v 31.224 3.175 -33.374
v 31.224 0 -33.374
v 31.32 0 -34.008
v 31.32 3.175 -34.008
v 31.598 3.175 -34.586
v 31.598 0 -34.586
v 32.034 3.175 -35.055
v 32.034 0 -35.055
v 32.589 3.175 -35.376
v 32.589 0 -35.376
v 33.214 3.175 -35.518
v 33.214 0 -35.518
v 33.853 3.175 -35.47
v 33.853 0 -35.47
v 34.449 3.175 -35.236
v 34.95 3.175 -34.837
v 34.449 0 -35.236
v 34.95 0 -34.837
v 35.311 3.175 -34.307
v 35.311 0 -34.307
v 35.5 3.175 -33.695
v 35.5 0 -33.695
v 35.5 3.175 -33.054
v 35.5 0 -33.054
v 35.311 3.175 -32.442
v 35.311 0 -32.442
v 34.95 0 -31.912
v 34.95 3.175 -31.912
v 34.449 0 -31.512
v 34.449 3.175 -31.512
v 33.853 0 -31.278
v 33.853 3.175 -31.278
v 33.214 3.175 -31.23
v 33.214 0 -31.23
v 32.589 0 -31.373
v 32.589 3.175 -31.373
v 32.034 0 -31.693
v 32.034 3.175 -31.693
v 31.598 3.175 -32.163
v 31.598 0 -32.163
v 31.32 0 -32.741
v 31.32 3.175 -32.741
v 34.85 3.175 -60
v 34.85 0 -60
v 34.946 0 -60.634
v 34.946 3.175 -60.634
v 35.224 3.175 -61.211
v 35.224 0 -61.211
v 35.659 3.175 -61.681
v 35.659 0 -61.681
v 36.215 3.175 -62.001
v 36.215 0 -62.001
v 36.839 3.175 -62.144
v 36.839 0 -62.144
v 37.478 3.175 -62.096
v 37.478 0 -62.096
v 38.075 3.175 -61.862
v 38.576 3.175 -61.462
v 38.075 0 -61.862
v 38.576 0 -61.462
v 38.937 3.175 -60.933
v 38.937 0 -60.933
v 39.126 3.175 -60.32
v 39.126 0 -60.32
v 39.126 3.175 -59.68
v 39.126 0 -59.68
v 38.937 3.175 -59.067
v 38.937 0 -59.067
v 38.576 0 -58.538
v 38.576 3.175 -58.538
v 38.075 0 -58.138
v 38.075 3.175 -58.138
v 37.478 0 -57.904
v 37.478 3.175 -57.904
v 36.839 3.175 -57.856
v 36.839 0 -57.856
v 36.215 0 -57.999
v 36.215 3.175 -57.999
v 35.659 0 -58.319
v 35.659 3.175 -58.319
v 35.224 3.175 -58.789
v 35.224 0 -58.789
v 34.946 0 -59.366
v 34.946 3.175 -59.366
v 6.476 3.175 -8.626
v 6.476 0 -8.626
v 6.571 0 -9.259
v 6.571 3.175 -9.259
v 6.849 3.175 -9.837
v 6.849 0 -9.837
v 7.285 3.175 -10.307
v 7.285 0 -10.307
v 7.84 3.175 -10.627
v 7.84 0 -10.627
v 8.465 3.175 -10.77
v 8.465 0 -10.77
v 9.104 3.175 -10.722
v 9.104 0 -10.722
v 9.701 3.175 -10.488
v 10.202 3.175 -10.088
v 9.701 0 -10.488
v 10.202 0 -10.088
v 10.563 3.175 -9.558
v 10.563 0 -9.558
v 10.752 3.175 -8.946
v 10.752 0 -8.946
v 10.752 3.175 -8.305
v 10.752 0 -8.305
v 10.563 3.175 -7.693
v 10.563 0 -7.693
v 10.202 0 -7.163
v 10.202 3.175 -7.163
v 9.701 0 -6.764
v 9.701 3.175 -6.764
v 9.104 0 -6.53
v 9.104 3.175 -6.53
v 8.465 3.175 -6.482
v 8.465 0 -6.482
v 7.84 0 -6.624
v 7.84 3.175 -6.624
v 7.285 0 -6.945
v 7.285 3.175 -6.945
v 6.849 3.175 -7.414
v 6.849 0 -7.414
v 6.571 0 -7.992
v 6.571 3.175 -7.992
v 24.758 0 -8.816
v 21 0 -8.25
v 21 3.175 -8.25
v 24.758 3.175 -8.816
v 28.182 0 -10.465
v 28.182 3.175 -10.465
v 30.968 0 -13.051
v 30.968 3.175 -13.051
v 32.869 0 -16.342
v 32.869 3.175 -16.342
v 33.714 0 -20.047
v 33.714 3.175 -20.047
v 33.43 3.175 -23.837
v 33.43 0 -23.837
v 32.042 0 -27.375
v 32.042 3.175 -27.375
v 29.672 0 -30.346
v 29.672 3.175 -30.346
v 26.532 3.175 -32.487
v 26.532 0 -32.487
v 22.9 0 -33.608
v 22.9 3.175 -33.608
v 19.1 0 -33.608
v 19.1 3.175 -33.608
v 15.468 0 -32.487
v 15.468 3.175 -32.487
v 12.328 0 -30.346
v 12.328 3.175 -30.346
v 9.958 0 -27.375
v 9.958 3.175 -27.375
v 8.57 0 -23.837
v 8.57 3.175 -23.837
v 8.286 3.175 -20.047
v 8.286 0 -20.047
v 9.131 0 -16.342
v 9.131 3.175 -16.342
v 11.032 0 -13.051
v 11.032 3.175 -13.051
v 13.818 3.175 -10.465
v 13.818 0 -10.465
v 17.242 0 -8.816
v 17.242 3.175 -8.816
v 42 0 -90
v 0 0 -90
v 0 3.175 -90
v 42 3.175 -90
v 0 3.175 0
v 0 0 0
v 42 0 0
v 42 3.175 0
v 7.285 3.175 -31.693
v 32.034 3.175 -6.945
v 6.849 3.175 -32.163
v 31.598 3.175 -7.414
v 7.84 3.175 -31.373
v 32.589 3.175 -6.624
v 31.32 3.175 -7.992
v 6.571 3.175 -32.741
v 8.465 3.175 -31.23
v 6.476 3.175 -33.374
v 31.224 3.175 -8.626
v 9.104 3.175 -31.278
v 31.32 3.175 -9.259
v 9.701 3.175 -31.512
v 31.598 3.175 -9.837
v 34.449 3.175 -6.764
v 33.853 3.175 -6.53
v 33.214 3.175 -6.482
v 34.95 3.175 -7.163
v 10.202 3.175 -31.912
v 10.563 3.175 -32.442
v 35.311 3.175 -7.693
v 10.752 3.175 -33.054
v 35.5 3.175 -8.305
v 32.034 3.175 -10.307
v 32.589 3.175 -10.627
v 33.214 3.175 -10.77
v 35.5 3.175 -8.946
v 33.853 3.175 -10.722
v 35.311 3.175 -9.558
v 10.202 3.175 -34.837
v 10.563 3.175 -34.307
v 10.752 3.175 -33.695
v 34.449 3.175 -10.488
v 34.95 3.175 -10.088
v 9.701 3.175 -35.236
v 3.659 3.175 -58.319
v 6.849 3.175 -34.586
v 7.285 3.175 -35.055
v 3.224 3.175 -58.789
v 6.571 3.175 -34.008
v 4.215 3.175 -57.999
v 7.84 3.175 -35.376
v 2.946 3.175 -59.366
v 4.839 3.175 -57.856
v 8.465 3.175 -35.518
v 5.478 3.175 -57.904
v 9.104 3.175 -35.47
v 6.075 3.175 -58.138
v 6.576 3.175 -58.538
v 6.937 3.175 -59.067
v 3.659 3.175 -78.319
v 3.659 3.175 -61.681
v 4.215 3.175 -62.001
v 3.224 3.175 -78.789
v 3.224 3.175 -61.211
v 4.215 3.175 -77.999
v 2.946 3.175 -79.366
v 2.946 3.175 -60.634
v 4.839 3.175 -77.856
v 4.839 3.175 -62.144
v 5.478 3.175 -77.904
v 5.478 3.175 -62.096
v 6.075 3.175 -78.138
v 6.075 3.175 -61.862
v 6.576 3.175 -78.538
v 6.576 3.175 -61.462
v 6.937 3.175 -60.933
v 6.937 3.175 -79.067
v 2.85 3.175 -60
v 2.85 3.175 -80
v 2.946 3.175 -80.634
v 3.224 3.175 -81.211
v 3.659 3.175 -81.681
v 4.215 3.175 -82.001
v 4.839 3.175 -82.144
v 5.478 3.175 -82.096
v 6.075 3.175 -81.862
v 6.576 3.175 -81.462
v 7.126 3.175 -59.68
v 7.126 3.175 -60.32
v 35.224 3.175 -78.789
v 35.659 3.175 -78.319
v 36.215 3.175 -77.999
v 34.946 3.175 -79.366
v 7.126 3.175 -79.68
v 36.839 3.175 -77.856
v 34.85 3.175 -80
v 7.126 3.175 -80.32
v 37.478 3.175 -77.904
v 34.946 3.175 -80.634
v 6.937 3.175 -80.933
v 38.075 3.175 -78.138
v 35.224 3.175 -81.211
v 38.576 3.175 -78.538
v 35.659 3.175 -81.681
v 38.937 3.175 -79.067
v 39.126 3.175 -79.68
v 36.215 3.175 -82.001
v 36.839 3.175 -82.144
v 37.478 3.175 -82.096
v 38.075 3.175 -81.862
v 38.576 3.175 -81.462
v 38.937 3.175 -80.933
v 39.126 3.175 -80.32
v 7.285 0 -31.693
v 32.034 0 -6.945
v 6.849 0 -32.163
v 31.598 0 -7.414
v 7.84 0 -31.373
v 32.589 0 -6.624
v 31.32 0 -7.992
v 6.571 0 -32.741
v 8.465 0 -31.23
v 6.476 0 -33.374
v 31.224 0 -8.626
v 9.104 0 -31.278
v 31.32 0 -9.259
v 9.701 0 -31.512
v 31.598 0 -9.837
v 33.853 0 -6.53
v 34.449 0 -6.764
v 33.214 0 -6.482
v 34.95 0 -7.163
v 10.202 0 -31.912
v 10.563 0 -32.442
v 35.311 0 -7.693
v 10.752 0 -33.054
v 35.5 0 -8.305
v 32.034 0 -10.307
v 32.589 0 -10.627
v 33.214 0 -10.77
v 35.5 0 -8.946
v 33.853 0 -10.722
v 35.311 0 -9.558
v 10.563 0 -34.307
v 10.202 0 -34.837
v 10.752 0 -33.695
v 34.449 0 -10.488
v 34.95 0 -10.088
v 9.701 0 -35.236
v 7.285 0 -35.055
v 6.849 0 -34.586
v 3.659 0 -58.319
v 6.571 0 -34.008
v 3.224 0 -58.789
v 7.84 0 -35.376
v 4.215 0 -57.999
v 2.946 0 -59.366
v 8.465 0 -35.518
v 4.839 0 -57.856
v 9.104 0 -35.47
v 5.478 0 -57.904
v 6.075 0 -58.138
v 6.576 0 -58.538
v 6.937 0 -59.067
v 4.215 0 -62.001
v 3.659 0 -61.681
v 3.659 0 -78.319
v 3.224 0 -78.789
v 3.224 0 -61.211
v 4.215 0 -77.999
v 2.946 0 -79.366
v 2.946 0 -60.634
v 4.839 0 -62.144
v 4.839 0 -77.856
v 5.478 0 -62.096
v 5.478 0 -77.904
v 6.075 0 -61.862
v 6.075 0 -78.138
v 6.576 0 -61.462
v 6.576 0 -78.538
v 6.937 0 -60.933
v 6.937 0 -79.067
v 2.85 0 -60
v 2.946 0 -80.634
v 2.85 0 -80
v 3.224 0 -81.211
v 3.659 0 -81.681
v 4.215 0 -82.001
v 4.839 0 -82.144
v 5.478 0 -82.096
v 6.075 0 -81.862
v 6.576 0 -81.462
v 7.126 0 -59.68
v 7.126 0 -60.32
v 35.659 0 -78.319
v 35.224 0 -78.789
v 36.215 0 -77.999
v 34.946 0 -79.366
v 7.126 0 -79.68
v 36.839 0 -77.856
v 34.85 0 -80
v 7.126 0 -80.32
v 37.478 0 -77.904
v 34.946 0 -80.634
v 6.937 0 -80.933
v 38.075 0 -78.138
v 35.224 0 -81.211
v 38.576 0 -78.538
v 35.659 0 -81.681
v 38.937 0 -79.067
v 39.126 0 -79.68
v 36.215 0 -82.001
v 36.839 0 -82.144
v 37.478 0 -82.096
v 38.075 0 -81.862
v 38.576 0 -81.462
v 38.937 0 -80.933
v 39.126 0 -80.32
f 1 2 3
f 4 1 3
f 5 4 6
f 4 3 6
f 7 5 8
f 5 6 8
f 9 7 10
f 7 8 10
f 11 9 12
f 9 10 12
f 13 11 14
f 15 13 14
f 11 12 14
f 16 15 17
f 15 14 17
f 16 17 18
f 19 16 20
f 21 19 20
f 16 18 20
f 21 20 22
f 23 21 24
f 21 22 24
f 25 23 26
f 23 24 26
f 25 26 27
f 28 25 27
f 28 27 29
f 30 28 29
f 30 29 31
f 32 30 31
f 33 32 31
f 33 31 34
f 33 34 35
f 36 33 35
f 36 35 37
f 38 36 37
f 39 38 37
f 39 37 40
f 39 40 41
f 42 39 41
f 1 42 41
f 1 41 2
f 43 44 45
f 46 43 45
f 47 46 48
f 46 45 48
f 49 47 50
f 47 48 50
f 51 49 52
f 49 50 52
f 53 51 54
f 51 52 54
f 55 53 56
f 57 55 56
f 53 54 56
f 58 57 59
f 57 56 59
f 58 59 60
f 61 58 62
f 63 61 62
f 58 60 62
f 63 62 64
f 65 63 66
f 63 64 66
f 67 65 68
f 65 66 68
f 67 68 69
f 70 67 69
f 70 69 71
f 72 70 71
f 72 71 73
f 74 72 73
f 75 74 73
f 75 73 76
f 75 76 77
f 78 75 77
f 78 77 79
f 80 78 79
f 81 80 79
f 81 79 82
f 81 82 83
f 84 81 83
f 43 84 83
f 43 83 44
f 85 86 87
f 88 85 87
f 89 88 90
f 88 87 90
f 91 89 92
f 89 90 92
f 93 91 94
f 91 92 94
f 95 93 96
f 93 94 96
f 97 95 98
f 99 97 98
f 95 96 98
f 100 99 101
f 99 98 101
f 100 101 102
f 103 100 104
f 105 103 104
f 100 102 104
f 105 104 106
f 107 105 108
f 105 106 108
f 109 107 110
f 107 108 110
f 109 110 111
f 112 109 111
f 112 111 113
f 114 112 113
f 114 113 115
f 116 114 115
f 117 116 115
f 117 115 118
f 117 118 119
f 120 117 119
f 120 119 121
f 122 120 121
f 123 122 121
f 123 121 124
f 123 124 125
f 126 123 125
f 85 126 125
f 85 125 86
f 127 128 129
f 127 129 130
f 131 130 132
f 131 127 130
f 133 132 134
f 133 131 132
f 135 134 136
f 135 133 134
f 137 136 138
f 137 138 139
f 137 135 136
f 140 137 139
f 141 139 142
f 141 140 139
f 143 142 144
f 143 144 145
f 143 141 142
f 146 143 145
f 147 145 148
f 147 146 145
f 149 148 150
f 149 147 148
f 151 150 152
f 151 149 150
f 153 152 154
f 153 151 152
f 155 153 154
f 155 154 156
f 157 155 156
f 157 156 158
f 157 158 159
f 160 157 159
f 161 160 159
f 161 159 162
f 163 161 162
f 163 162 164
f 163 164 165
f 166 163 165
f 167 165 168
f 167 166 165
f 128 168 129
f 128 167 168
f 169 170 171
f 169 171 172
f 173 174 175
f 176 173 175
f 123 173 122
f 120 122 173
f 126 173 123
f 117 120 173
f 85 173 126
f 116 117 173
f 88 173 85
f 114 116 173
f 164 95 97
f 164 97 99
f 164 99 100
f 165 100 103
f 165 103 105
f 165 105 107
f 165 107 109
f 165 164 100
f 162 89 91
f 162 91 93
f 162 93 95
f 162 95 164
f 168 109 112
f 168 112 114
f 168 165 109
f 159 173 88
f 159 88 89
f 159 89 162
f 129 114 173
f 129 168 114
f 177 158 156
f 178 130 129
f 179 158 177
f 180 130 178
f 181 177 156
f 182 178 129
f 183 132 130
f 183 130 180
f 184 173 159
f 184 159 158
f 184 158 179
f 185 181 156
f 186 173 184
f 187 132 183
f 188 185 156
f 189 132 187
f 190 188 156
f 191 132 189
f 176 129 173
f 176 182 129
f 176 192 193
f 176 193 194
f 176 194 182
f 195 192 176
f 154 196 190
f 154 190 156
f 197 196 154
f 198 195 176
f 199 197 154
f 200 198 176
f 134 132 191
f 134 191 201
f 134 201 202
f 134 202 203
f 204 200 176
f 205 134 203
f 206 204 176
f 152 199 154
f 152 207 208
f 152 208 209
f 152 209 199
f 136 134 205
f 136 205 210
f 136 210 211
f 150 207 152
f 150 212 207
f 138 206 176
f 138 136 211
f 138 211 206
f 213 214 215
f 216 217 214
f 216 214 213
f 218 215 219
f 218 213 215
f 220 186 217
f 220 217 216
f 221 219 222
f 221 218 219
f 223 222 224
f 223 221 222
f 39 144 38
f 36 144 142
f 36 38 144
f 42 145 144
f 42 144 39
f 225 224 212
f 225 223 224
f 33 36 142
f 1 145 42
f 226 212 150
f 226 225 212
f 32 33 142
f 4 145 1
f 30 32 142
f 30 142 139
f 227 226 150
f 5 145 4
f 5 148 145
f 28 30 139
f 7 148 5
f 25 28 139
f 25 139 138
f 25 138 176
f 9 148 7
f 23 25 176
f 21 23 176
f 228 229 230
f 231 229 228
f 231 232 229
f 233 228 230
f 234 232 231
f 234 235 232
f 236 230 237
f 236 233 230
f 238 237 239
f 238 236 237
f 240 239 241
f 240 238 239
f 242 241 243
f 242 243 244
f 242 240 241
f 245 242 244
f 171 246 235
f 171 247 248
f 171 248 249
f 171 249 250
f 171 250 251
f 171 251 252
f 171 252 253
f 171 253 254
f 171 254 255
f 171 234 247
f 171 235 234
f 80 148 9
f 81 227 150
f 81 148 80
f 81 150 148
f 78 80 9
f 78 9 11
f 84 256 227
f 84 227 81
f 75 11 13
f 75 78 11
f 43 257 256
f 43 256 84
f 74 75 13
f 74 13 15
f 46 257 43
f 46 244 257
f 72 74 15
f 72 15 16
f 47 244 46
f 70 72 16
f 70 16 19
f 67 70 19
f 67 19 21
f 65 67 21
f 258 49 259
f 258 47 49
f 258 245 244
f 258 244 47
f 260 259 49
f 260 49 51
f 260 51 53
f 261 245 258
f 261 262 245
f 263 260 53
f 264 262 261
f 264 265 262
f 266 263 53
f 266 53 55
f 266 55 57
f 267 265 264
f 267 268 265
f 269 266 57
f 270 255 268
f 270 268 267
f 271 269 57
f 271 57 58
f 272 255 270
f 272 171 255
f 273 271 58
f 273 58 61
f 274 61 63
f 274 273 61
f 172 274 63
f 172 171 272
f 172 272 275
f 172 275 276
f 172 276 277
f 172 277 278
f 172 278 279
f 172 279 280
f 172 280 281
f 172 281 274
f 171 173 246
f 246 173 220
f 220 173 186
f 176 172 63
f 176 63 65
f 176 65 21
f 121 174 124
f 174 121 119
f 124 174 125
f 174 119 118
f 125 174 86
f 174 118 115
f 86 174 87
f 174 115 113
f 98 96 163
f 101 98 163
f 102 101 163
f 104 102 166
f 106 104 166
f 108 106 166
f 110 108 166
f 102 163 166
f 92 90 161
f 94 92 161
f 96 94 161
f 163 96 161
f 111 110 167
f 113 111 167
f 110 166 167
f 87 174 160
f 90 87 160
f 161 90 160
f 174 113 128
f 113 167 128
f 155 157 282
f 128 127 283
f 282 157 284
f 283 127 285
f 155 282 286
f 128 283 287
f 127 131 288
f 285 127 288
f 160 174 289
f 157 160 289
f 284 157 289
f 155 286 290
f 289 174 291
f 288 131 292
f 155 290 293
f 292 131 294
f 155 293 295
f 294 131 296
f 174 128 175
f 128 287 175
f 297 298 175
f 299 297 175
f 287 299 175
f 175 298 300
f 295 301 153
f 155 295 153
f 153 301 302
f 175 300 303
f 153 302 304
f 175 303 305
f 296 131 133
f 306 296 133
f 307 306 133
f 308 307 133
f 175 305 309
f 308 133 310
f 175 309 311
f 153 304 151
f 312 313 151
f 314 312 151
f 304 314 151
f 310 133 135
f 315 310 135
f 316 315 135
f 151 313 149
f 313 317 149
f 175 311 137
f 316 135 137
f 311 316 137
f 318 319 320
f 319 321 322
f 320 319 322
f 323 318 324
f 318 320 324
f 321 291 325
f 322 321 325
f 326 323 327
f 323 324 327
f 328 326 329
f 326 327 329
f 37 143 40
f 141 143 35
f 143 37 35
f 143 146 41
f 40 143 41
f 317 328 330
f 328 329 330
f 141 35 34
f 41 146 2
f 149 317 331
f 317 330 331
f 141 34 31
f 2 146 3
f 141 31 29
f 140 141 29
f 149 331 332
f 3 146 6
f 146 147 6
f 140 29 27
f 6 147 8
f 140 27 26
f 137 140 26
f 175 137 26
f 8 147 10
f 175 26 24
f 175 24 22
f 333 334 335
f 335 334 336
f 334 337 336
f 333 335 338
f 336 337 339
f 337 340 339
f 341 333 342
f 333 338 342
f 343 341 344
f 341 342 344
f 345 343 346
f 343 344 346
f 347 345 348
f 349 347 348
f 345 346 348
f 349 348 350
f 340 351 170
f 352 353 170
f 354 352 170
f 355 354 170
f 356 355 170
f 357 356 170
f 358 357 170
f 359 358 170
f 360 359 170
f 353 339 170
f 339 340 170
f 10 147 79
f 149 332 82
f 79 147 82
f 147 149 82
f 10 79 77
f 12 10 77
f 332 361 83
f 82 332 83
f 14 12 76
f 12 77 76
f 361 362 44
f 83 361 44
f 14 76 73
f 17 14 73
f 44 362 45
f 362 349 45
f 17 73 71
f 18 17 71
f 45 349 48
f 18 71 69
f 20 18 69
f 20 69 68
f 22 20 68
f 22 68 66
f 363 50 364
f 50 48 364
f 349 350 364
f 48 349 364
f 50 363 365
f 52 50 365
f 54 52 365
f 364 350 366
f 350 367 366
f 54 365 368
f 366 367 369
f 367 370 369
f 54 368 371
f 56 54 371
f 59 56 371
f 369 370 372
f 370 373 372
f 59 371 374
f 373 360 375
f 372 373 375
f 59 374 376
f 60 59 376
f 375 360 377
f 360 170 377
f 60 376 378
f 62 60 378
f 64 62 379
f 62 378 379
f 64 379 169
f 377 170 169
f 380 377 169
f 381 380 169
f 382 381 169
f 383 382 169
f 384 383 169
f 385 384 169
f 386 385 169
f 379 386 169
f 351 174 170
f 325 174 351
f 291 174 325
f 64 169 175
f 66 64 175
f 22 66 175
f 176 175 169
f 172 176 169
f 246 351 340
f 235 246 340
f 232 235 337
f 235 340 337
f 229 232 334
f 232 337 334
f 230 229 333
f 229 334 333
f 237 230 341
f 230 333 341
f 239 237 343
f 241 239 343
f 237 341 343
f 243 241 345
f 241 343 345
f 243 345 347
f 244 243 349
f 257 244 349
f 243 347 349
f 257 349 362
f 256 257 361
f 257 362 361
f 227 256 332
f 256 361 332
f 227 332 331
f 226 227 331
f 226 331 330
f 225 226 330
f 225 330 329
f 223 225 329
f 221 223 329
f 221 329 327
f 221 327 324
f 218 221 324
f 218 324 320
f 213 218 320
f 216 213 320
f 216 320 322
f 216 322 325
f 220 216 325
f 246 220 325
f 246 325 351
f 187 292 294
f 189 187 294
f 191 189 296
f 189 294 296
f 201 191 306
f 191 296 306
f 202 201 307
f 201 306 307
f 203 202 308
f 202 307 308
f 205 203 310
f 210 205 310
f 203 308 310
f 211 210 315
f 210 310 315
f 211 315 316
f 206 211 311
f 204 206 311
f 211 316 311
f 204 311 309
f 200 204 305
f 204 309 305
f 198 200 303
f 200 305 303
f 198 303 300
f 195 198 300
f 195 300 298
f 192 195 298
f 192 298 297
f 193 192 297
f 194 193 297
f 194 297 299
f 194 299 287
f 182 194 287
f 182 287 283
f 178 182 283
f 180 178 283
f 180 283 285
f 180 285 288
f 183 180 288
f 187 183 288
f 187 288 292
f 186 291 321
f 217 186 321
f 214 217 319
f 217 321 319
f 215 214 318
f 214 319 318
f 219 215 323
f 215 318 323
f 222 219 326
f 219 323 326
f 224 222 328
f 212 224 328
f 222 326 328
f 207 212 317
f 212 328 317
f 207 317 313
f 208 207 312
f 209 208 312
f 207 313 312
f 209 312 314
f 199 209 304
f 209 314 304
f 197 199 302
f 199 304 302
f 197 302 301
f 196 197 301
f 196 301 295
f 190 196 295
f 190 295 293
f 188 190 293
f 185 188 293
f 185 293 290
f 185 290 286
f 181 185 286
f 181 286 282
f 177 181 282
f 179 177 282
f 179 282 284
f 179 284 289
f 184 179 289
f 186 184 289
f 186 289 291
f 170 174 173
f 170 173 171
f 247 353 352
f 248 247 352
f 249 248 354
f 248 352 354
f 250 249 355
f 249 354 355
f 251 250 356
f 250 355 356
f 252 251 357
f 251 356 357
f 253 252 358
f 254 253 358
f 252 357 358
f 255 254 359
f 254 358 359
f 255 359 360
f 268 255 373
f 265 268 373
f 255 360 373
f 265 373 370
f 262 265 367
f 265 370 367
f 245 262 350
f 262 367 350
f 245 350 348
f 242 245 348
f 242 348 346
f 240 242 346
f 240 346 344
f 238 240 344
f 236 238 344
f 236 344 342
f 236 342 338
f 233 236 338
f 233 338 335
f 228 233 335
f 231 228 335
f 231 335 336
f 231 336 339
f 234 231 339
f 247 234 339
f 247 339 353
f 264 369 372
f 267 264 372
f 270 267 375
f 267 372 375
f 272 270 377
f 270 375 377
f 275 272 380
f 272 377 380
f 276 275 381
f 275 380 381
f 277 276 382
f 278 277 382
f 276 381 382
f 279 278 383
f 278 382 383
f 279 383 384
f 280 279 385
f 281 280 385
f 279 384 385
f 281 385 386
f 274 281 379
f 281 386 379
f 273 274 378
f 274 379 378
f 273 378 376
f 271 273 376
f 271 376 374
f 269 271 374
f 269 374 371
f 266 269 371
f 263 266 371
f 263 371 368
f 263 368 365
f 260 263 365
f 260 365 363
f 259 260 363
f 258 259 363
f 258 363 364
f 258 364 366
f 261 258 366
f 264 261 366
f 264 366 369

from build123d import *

# Parameters (mm, degrees)
SKETCH1_W            = 42
SKETCH1_H            = 90
SKETCH1_R            = 12.75
BOSS_EXTRUDE1_DEPTH  = 3.175
M4_CLEARANCE_HOLE1_D = 4.3


with BuildPart() as part:
    # Sketch1 → Boss-Extrude1 (new body)
    with BuildSketch(Plane(origin=(0, 0, 0), x_dir=(1, 0, 0), z_dir=(0, 1, 0))):
        with Locations((21, 45)):
            Rectangle(SKETCH1_W, SKETCH1_H)
        with Locations((21, 21)):
            Circle(SKETCH1_R, mode=Mode.SUBTRACT)
    extrude(amount=BOSS_EXTRUDE1_DEPTH)

    # M4 Clearance Hole1 (through all)
    with Locations(Plane(origin=(0, 3.175, 0), x_dir=(1, 0, 0), z_dir=(0, 1, 0))):
        with Locations((8.625631329, 33.374368671), (21, 21), (5, 80), (33.374368671, 33.374368671), (33.374368671, 8.625631329), (8.625631329, 8.625631329), (37, 80), (37, 60), (5, 60)):
            Hole(M4_CLEARANCE_HOLE1_D / 2)


solid = part.part
